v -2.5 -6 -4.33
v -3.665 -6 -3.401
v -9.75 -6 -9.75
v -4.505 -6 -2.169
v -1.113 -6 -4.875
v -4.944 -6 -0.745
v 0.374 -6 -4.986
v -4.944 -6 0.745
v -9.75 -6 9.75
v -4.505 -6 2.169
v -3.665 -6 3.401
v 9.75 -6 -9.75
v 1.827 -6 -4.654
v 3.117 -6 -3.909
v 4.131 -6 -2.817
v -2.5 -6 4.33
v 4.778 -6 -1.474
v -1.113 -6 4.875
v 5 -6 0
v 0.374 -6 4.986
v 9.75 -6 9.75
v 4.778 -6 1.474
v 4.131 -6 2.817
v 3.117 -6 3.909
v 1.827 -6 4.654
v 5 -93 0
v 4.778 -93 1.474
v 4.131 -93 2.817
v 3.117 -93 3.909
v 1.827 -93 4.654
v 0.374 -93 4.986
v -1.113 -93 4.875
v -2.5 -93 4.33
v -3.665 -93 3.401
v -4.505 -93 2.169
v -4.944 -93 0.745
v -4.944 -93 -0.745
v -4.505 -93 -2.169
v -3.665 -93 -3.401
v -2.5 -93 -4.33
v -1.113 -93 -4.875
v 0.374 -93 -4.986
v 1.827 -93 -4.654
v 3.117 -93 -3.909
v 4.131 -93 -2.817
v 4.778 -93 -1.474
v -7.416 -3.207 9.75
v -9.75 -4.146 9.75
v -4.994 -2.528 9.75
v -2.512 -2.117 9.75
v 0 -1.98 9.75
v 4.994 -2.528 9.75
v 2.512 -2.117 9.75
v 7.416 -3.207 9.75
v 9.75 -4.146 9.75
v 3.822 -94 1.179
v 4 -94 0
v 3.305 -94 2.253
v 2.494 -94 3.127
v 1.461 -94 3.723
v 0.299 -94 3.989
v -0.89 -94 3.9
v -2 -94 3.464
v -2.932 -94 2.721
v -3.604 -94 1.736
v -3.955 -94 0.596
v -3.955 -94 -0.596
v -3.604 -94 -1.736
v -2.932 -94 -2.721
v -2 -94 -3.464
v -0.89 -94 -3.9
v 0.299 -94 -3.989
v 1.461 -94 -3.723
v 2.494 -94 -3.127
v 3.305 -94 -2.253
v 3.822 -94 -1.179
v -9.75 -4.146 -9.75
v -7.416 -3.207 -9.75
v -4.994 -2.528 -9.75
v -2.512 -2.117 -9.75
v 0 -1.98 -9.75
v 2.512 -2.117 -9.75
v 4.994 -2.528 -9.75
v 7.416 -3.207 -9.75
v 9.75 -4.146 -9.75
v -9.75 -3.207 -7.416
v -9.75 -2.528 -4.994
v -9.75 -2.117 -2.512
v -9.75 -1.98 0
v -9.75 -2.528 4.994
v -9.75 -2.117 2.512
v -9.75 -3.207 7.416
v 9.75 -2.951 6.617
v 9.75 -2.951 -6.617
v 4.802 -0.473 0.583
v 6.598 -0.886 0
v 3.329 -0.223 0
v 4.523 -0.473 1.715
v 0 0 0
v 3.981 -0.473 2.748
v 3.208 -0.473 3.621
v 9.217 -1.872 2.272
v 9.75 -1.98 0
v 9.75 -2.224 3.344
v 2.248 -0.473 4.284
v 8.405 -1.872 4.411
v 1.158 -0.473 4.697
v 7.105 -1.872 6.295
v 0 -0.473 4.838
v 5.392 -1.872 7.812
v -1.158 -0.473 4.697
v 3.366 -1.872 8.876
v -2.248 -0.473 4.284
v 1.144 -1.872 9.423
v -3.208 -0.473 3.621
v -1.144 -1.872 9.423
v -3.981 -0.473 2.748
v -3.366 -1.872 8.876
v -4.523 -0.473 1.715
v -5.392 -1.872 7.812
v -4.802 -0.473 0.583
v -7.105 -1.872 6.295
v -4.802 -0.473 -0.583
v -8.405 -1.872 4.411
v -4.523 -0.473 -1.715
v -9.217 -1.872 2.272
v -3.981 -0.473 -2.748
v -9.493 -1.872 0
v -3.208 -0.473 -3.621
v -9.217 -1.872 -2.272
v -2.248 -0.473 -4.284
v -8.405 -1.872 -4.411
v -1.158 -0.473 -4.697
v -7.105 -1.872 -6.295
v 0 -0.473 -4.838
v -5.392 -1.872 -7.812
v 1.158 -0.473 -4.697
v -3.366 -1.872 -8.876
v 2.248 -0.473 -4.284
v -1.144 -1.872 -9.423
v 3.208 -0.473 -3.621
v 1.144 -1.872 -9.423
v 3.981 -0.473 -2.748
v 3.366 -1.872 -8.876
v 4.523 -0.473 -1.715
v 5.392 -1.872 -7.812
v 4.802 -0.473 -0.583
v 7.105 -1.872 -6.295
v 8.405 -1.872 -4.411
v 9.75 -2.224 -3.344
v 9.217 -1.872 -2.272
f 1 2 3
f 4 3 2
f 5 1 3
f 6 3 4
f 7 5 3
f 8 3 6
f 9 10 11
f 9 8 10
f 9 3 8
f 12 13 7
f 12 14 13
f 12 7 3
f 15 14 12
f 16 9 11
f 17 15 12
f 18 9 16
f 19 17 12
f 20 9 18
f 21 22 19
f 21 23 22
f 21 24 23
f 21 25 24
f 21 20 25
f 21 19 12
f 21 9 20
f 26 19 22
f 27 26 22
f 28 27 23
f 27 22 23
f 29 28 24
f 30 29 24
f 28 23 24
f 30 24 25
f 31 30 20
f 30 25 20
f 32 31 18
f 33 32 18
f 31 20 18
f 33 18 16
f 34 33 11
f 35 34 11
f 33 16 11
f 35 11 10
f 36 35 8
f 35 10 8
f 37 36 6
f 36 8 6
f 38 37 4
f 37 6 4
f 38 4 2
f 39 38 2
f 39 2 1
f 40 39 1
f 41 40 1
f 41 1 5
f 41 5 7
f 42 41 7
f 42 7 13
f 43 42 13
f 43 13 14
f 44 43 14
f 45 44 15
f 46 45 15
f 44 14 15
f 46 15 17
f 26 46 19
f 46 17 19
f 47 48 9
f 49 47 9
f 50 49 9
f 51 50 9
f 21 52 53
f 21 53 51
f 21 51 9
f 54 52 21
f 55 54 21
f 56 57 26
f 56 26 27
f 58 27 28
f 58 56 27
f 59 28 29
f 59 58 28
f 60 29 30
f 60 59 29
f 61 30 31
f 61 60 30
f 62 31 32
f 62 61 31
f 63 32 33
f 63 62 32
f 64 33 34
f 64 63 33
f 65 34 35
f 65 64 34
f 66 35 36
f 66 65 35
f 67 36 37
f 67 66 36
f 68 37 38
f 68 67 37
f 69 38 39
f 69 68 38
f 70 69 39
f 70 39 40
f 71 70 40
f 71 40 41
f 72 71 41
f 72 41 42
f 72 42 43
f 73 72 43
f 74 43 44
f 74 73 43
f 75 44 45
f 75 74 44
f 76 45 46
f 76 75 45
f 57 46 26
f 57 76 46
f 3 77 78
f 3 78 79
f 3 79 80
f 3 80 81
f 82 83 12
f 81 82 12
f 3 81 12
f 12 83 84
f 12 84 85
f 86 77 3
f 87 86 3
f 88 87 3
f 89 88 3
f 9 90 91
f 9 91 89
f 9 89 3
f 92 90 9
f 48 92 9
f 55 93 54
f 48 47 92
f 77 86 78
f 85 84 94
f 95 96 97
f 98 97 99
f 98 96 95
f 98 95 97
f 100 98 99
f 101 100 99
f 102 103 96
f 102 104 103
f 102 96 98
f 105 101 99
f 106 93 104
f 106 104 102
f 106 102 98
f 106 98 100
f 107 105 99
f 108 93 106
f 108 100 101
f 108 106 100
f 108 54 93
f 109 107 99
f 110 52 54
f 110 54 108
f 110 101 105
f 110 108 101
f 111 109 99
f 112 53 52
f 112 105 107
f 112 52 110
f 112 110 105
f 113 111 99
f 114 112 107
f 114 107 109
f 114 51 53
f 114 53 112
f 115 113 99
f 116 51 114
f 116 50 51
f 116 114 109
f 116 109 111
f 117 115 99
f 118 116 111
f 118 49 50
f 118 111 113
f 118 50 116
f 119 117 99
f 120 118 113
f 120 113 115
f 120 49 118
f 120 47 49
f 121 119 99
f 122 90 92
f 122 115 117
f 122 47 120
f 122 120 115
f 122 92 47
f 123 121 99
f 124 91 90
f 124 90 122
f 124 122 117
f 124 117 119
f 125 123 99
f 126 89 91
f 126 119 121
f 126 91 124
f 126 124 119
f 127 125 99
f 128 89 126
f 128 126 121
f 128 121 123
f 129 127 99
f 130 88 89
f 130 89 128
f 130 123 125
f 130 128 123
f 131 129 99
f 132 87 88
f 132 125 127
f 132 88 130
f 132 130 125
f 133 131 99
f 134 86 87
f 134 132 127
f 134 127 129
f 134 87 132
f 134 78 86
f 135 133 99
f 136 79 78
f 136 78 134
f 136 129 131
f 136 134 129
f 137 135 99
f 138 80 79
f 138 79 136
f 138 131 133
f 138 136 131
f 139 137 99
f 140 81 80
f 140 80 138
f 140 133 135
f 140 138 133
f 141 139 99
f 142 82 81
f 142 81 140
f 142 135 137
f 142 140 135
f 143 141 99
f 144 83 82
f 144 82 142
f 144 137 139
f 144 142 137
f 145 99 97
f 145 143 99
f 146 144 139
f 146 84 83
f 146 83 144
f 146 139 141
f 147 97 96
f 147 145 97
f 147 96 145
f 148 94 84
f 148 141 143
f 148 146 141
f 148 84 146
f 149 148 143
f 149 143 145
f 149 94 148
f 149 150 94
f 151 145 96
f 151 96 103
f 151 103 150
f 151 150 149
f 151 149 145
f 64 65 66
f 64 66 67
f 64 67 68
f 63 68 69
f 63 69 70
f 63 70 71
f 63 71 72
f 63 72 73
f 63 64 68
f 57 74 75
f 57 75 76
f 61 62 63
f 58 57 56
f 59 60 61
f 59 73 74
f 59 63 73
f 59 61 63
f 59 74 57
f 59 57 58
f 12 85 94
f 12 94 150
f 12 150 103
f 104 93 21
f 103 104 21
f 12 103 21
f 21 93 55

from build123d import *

# Parameters (mm, degrees)
F0_W     = 19.5
F0_H     = 19.5
F1_DEPTH = 6
F2_R     = 5
F3_DEPTH = 88
F4_SIZE  = 1


with BuildPart() as f1:
    # F0 (on Front) → F1 (new body)
    with BuildSketch(Plane.XZ):
        Rectangle(F0_W, F0_H)
    extrude(amount=F1_DEPTH)

    # F2 (on face) → F3 (join)
    with BuildSketch(Plane.XZ.offset(6)):
        Circle(F2_R)
    extrude(amount=F3_DEPTH)

    # F4
    f4_edges = [f1.edges().sort_by_distance(p)[0] for p in [
        (-5, -94, 0),
    ]]
    chamfer(f4_edges, length=F4_SIZE)

    # F5 (on Top) → F6 (revolve, cut)
    with BuildSketch(Plane.XY):
        with BuildLine():
            ThreePointArc((0, 0), (17.6776695297, -7.3223304703), (25, -25))
            Line((25, -25), (35.5271379938, -25))
            ThreePointArc((35.5271379938, -25), (25.1214801916, 0.1214801916), (0, 10.5271379938))
            Line((0, 10.5271379938), (0, 0))
        make_face()
    revolve(axis=Axis((0, 5.2635689969, 0), (0, -1, 0)), mode=Mode.SUBTRACT)


solid = f1.part
